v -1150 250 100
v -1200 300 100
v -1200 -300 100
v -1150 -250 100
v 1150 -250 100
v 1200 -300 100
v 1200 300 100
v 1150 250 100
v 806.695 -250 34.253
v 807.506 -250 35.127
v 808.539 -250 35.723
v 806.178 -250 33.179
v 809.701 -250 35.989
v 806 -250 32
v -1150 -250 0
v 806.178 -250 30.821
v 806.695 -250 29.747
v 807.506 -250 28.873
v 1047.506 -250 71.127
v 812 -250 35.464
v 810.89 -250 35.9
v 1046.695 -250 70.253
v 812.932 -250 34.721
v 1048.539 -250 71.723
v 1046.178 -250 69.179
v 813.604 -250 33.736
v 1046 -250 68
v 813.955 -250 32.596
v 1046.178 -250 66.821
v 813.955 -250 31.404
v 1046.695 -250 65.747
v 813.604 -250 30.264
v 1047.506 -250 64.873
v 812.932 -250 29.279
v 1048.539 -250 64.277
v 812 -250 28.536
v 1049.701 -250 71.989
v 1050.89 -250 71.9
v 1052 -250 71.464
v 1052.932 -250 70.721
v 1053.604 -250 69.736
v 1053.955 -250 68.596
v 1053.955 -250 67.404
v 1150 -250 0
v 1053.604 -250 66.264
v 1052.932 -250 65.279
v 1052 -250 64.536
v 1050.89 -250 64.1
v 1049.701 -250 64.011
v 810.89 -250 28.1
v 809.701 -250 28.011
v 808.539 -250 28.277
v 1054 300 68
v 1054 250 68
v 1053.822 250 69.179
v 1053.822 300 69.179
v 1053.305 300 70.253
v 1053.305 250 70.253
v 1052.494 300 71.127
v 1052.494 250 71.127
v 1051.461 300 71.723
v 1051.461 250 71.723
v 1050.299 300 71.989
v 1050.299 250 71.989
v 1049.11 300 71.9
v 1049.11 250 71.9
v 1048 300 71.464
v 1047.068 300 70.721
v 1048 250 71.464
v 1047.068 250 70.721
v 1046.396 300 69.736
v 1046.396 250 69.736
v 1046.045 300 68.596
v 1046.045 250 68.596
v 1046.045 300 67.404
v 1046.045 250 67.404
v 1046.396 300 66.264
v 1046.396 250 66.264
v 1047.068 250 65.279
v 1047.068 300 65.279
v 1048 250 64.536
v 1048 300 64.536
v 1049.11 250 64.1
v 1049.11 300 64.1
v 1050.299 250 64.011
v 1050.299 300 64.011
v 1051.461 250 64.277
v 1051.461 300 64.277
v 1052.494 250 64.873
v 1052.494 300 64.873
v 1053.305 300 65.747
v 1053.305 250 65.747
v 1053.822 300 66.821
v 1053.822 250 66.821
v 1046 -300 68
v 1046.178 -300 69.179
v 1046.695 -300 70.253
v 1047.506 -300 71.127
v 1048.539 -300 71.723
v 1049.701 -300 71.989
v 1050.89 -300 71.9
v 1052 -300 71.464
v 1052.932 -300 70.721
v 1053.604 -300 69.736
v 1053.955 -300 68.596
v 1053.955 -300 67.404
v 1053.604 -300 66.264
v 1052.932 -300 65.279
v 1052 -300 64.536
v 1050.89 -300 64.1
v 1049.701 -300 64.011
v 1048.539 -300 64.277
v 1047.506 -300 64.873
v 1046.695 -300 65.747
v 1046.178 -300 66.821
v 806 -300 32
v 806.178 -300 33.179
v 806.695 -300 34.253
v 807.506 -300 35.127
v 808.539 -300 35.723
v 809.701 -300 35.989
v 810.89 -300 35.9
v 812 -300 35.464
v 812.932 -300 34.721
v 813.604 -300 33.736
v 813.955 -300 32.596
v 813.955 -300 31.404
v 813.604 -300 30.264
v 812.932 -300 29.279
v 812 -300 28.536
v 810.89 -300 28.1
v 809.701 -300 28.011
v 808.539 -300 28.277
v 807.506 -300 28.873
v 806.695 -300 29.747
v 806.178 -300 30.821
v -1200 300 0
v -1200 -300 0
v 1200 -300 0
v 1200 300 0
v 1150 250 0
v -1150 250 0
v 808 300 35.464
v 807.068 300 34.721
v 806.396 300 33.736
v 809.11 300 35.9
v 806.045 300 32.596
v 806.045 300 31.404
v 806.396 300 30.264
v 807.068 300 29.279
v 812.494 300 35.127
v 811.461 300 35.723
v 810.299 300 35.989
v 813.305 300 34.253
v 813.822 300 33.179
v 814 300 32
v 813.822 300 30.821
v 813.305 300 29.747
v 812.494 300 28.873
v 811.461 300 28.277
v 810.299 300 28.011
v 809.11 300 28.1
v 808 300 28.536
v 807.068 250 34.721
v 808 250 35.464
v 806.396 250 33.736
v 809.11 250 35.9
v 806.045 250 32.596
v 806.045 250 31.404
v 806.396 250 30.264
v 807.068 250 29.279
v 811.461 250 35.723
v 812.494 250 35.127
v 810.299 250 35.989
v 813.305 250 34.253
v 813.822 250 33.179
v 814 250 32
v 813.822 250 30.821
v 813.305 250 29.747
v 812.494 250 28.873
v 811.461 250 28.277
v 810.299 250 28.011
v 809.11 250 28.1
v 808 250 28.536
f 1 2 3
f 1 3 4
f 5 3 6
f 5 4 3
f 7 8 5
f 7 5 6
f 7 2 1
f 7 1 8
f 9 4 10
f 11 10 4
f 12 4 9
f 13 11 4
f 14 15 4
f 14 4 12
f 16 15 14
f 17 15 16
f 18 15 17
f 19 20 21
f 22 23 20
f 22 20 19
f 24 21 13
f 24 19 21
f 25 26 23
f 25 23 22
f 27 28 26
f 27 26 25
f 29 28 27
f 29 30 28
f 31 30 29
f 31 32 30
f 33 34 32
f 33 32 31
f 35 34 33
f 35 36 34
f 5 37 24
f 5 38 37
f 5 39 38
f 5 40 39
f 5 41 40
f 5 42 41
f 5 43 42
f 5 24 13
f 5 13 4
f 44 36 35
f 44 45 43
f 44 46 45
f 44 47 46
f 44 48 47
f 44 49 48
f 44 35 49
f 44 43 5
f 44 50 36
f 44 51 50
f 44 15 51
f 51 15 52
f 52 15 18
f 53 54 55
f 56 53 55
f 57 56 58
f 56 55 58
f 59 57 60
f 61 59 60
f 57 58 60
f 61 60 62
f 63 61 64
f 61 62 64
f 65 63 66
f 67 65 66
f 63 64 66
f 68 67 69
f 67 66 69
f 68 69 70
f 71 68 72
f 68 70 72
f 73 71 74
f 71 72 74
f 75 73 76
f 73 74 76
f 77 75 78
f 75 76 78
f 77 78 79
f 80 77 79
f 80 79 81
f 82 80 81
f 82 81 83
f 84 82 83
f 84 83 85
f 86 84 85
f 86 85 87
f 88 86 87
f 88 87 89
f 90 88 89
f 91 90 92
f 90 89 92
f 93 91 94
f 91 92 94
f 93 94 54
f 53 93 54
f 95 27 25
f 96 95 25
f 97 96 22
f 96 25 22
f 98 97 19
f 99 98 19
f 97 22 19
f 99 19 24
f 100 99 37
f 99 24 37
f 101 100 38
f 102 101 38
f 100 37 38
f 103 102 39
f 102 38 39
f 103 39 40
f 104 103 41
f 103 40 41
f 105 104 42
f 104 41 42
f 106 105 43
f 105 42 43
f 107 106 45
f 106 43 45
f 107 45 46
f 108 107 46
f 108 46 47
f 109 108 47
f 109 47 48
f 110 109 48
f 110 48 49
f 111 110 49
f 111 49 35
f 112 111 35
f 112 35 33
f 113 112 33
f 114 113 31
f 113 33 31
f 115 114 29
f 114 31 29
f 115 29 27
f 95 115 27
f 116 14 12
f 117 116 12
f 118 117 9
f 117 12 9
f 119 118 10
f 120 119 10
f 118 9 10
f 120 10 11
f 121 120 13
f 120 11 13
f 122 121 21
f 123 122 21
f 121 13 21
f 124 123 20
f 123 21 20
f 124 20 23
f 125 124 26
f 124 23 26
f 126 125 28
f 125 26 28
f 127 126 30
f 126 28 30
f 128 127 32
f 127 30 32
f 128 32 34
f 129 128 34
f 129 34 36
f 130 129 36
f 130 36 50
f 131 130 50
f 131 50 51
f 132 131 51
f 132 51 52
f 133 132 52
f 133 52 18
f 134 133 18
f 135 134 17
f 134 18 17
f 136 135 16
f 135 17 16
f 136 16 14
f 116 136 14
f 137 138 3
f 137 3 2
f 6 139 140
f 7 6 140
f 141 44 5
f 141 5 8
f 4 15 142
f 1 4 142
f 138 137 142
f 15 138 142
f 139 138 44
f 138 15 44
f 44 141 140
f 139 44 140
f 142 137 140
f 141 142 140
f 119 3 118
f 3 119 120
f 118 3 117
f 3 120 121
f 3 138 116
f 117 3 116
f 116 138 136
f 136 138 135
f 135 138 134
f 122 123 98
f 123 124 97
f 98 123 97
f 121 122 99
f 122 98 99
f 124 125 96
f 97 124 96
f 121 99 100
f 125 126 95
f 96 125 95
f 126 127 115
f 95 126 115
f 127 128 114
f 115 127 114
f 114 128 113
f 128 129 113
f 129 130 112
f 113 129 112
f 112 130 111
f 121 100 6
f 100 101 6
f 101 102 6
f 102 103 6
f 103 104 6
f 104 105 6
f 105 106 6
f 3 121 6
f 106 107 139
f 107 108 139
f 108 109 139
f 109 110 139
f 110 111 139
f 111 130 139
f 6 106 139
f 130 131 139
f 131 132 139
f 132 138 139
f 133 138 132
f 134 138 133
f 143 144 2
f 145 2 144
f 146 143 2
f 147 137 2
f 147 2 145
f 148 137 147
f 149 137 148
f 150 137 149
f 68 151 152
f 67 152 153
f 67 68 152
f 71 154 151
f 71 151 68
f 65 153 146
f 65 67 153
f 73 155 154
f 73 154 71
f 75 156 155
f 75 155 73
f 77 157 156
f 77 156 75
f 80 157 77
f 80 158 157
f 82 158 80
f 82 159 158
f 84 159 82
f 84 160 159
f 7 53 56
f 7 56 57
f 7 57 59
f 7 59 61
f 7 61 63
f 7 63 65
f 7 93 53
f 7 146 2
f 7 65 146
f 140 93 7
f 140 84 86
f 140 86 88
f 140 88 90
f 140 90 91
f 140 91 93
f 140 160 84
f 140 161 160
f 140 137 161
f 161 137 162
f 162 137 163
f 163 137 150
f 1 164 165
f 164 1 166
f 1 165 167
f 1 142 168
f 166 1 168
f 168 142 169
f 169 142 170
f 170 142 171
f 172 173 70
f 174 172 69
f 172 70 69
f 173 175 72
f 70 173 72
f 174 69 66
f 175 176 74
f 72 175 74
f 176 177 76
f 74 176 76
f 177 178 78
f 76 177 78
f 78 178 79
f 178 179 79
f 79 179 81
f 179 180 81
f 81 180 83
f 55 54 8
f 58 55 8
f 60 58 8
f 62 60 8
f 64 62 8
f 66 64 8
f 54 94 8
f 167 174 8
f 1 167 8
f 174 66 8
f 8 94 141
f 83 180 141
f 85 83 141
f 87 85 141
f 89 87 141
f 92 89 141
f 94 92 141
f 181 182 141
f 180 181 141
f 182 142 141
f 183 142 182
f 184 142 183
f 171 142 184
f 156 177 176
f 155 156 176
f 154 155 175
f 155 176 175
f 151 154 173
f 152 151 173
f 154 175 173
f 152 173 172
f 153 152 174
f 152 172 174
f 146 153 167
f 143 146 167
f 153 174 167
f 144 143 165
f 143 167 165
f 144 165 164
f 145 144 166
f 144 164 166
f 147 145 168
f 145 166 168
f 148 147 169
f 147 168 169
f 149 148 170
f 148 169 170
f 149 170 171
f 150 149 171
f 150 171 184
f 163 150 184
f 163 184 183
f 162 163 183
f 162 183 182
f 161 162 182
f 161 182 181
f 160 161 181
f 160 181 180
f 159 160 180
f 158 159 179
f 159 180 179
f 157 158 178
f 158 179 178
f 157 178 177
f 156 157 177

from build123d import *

# Parameters (mm, degrees)
F0_W     = 2400
F0_H     = 600
F0_W_2   = 2300
F0_H_2   = 500
F1_DEPTH = 100
F2_R     = 4
F3_DEPTH = 50
F4_R     = 4
F5_DEPTH = 50


with BuildPart() as f1:
    # F0 (on Top) → F1 (new body)
    with BuildSketch(Plane.XY):
        Rectangle(F0_W, F0_H)
        Rectangle(F0_W_2, F0_H_2, mode=Mode.SUBTRACT)
    extrude(amount=F1_DEPTH)

    # F2 (on face) → F3 (cut, through all)
    with BuildSketch(Plane.XZ.offset(-250)):
        with Locations((810, 32)):
            Circle(F2_R)
        with Locations((1050, 68)):
            Circle(F2_R)
    extrude(amount=-F3_DEPTH, mode=Mode.SUBTRACT)

    # F4 (on face) → F5 (cut, through all)
    with BuildSketch(Plane(origin=(0, -250, 0), x_dir=(-1, 0, 0), z_dir=(0, 1, 0))):
        with Locations((-810, 32)):
            Circle(F4_R)
        with Locations((-1050, 68)):
            Circle(F4_R)
    extrude(amount=-F5_DEPTH, mode=Mode.SUBTRACT)


solid = f1.part
